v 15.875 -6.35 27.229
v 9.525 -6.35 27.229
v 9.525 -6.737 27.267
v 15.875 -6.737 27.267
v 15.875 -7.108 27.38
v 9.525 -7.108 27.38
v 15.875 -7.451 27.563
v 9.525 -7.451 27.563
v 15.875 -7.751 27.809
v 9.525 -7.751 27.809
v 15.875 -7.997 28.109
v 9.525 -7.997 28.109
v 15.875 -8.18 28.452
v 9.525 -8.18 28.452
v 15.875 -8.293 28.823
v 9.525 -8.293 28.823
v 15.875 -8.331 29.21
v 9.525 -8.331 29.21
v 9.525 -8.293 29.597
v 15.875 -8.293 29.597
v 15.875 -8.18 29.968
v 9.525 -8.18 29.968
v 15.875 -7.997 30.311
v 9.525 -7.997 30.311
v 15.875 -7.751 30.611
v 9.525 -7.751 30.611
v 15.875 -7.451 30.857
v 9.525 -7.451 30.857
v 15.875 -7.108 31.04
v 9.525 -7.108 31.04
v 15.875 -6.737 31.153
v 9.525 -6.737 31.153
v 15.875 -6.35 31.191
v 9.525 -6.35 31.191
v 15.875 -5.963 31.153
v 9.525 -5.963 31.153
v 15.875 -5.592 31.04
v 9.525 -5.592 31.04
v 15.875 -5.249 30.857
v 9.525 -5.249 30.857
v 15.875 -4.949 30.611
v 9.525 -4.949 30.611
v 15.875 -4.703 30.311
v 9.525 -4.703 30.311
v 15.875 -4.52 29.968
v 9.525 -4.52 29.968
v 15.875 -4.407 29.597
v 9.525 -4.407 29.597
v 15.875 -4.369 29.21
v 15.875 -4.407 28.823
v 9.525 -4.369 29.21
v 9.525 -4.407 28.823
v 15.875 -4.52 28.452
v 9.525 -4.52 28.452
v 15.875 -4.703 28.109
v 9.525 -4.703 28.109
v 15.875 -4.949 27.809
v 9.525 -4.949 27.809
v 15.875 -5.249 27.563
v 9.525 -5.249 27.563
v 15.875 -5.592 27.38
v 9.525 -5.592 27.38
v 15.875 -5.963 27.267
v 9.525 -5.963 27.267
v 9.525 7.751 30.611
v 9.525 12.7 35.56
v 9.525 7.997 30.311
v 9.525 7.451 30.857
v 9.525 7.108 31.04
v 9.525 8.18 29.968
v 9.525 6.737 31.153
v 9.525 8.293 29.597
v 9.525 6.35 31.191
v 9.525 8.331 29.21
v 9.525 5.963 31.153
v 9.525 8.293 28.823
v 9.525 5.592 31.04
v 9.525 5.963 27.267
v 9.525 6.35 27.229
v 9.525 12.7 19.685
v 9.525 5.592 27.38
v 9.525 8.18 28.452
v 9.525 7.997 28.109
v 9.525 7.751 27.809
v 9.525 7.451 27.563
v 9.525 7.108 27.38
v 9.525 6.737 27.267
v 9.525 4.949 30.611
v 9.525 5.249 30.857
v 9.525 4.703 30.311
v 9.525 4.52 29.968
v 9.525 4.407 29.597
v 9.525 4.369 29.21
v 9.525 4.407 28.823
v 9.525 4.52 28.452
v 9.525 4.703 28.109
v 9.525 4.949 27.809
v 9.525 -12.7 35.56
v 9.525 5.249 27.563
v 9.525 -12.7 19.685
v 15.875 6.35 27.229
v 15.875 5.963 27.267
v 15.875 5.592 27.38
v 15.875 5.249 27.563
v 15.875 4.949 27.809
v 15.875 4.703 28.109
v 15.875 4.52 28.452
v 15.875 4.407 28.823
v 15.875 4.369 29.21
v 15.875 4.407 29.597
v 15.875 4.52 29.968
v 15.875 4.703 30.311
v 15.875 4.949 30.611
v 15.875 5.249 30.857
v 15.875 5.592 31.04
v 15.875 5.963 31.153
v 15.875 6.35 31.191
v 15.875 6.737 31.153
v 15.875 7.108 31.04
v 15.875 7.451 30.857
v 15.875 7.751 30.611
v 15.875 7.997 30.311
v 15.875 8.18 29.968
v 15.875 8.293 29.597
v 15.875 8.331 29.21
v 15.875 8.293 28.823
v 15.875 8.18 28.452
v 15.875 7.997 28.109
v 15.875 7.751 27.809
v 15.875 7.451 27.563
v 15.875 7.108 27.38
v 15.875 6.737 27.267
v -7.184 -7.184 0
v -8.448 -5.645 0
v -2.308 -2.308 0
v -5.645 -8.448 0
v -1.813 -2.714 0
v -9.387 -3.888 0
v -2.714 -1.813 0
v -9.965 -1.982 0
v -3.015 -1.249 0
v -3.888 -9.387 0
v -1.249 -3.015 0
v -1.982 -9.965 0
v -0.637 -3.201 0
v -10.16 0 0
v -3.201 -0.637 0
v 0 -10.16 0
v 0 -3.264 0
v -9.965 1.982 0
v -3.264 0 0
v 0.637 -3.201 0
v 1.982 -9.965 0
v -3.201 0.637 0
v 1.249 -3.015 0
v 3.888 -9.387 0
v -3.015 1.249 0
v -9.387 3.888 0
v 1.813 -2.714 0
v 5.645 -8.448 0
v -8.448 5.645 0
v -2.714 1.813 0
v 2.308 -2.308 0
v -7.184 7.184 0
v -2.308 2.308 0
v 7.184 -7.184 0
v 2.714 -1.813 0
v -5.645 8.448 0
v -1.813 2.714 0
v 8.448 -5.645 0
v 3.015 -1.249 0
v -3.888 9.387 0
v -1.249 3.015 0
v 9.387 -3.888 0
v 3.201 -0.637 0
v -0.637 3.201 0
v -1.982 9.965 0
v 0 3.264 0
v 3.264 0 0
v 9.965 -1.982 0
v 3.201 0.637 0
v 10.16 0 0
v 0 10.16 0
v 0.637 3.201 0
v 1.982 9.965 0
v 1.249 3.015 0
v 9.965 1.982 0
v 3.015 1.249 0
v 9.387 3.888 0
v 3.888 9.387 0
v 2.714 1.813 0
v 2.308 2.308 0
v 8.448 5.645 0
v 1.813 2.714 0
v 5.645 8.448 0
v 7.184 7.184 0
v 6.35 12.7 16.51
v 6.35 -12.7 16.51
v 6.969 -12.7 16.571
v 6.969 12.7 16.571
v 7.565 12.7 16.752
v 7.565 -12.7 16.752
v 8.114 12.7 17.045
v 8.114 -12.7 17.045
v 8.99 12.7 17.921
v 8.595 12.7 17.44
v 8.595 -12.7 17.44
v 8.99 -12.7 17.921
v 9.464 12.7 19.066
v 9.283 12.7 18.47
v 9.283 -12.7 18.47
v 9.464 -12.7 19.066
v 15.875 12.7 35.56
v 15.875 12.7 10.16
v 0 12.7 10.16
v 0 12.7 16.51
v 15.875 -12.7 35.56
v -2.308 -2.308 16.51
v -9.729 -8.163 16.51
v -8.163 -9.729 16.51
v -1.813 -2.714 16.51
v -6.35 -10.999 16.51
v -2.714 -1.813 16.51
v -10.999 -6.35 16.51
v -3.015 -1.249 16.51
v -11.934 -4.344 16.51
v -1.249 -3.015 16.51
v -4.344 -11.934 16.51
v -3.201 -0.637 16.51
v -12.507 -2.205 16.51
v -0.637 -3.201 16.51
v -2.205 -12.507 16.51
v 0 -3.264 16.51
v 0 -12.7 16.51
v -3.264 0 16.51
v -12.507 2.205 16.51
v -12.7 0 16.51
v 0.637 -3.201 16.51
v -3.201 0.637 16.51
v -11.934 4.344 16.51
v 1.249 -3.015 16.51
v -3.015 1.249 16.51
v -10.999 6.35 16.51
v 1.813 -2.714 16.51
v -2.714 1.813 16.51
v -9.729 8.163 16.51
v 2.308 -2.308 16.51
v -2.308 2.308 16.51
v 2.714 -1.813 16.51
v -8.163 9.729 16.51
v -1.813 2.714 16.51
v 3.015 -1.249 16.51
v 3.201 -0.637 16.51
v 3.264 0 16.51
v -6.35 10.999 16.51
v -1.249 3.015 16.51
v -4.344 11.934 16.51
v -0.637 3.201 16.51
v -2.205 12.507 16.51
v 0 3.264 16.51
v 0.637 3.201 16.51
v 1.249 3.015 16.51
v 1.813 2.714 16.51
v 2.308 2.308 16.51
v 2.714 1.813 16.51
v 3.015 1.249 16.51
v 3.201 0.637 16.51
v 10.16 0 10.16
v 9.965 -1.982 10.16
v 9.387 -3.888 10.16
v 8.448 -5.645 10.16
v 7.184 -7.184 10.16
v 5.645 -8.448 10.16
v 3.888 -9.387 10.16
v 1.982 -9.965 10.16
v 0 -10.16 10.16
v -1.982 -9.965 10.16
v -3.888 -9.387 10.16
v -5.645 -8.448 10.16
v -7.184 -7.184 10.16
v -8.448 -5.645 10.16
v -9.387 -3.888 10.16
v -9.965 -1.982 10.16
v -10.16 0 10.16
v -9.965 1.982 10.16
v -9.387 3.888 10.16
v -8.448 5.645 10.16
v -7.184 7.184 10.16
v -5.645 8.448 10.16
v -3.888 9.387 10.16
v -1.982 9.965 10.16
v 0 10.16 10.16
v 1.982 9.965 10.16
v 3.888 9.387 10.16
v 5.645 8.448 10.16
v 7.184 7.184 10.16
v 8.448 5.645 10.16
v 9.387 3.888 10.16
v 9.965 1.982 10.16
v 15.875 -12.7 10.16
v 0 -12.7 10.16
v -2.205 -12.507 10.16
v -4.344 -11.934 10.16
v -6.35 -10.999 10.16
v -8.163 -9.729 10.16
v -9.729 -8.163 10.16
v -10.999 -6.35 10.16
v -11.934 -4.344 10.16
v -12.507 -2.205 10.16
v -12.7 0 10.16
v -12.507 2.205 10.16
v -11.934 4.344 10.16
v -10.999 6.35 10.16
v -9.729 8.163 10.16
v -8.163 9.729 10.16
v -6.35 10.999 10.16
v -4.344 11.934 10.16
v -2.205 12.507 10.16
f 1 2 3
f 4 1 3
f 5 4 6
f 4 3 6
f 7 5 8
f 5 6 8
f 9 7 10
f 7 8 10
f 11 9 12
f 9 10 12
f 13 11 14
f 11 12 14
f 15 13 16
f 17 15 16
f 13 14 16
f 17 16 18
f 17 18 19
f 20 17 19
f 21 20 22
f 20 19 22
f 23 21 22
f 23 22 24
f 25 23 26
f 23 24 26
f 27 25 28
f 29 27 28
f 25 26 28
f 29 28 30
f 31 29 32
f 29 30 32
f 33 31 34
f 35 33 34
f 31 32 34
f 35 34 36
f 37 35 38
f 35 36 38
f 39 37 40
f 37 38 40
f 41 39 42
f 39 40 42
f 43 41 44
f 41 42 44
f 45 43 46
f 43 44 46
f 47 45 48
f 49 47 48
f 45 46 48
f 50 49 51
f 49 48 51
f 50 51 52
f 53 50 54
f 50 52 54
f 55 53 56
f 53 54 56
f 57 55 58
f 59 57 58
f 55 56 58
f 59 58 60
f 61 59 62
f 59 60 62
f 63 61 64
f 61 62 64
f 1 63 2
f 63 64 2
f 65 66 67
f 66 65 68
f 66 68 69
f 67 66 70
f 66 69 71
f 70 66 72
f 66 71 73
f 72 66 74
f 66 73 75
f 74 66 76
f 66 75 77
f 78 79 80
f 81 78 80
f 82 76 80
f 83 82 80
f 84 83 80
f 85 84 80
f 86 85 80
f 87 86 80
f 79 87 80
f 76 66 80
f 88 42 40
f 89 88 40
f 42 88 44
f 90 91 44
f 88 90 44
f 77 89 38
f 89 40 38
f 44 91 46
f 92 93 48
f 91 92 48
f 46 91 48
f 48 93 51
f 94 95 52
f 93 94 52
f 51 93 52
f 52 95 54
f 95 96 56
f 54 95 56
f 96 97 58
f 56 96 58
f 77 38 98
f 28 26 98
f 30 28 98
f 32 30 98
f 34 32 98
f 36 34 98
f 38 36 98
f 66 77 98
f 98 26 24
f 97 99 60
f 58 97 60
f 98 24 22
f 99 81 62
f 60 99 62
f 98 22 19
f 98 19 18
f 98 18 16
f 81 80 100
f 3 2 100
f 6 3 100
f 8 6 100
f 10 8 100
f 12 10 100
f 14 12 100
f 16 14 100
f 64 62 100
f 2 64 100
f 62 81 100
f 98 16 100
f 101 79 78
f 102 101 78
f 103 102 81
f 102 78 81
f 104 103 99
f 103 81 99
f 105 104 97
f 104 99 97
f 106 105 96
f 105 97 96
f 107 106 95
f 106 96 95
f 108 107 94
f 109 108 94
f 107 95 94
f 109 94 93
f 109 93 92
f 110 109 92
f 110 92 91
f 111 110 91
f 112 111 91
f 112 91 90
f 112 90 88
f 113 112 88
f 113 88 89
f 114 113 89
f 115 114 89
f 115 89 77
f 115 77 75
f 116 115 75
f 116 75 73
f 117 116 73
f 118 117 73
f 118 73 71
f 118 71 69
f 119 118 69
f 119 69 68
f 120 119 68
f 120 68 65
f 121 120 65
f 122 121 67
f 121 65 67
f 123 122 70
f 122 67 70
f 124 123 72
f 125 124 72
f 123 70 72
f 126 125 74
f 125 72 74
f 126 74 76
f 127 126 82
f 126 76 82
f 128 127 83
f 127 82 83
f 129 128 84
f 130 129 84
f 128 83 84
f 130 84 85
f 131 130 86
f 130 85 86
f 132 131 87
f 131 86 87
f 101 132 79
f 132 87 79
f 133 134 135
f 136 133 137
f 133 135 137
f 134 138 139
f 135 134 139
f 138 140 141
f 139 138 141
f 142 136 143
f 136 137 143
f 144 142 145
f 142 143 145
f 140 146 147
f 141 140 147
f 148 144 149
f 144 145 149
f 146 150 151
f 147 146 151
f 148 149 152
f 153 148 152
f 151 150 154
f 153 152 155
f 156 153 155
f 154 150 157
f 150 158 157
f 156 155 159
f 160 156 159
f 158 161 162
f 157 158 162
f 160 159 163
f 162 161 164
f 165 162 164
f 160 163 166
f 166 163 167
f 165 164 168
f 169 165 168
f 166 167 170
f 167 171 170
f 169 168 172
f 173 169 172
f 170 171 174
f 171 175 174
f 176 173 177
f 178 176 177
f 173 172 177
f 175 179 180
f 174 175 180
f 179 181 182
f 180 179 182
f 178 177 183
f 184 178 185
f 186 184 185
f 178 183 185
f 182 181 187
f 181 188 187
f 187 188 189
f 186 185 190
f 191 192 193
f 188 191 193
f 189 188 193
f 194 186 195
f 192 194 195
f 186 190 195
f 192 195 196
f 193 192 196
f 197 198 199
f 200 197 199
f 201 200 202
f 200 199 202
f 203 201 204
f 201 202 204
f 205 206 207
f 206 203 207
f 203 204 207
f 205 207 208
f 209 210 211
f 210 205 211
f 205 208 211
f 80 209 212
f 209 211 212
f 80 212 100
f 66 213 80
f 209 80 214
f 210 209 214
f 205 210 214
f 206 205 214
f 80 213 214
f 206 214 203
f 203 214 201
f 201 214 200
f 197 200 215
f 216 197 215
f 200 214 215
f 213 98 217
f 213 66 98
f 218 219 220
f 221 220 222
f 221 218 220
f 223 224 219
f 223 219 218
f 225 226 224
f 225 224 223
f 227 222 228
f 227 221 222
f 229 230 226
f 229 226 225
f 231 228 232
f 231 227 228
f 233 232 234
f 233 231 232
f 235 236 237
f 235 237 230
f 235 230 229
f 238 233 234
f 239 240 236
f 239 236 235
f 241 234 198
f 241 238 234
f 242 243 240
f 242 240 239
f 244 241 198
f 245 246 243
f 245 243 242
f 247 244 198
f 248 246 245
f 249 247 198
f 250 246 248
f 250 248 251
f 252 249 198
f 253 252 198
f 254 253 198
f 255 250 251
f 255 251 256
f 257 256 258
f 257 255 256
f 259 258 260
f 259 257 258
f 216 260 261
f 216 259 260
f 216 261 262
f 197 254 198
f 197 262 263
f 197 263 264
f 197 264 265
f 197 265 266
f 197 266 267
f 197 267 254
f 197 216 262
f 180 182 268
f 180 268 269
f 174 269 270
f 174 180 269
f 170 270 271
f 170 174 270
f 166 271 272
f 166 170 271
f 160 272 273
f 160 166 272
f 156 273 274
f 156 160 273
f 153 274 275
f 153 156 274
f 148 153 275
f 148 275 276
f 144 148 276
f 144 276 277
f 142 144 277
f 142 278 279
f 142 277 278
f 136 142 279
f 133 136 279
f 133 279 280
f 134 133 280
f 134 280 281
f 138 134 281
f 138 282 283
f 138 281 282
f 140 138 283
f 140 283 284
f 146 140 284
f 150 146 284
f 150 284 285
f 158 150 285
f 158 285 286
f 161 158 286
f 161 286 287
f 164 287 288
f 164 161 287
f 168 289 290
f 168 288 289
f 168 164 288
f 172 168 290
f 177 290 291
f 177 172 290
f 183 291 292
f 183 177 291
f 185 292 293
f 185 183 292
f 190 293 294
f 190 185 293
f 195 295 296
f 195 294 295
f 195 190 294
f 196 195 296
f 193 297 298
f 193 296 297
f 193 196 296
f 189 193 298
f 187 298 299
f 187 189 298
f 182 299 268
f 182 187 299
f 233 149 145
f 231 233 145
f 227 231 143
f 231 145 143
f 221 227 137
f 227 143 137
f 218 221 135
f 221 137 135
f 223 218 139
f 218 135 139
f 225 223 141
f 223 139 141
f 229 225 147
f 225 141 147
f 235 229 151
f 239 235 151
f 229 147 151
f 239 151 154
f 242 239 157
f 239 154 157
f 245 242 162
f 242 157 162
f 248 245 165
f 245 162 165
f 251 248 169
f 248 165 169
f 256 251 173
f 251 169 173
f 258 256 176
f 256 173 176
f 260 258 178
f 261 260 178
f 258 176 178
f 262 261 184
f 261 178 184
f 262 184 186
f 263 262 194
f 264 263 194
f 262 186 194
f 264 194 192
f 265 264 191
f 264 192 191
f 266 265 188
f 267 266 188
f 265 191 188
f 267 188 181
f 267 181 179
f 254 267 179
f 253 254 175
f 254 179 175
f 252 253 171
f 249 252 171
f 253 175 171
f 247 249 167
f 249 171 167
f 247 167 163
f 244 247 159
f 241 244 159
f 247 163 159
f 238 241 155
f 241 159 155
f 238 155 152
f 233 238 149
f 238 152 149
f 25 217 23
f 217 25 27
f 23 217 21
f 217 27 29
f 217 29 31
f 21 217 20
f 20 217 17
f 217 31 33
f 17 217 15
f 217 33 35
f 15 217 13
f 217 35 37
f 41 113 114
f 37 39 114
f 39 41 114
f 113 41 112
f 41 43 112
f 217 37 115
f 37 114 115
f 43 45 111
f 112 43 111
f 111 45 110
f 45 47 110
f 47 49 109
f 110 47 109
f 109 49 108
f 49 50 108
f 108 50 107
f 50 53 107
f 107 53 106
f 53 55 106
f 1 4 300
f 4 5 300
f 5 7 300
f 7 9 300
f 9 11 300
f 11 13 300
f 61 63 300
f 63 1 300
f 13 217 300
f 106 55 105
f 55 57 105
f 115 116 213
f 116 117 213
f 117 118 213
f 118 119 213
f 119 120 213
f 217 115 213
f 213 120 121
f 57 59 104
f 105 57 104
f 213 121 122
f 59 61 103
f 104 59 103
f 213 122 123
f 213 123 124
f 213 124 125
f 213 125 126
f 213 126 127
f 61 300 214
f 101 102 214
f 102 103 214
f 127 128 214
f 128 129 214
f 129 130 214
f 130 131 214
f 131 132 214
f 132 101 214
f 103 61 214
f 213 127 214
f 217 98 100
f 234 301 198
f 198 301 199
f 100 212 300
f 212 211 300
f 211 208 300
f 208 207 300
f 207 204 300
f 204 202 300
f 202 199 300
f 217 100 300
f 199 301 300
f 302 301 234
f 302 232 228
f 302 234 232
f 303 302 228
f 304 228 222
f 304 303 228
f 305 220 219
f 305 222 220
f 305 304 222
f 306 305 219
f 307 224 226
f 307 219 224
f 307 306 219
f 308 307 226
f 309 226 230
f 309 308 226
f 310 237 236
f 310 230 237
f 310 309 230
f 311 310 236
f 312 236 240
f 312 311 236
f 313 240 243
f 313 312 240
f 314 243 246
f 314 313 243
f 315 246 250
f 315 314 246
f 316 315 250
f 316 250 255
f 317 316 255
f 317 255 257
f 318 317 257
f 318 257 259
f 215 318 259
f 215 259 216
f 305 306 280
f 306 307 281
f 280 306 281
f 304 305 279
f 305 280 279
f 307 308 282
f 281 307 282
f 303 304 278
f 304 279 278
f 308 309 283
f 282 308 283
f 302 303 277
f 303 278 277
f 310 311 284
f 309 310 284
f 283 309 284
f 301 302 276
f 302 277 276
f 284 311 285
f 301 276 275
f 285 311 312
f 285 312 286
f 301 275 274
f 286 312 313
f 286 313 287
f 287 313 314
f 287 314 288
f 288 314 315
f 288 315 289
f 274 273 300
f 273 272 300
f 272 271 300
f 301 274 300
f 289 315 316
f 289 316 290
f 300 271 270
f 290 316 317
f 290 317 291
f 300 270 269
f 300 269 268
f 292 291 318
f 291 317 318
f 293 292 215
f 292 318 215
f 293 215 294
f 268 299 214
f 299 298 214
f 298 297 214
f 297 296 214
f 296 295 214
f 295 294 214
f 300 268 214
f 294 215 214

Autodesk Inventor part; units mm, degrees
ref_plane "YZ Plane" through (0, 0, 0) normal (1, 0, 0) x (0, 1, 0)
ref_plane "XZ Plane" through (0, 0, 0) normal (0, 1, 0) x (-1, 0, 0)
ref_plane "XY Plane" through (0, 0, 0) normal (0, 0, 1) x (1, 0, 0)
sketch "Sketch1" plane through (0, 0, 0) normal (0, 0, 1) x (1, 0, 0)
  circle A0 centre (0, 0) radius 10.16
  circle A1 centre (0, 0) radius 8.7376
  dimension "d0" = 20.32
  dimension "d6" = 17.4752
extrude "Extrusion1" add sketch "Sketch1" along normal blind 10.16 contours A0 | A1
sketch "Sketch2" plane through (0, 0, 10.16) normal (0, 0, 1) x (1, 0, 0)
  circle A0 centre (0, 0) radius 10.16 projected
  circle A1 centre (0, 0) radius 12.7 construction
  line L0 (0, 12.7) -> (15.875, 12.7)
  line L1 (15.875, 12.7) -> (15.875, -12.7)
  line L2 (15.875, -12.7) -> (0, -12.7)
  arc A2 (0, 12.7) -> (0, -12.7) centre (0, 0) ccw
  point P0 (15.875, 0)
  dimension "d3" = 2.54
  dimension "d14" = 15.875
  dimension "d35" = 25.4
extrude "Extrusion2" add sketch "Sketch2" along normal blind 6.35 contours A0 | L0 L1 L2 A2
sketch "Sketch4" plane through (0, 0, 16.51) normal (0, 0, 1) x (1, 0, 0)
  arc A0 (0, 12.7) -> (0, -12.7) centre (0, 0) ccw projected
hole "Hole2" at (0, 0, 16.51) direction (0, 0, -1) diameter 6.5278 end through all clearance for "Flat Head Machine Screw (82)" size "1/4" standard "Ansi Unified Screw Threads"
sketch "Sketch5" plane through (0, 0, 16.51) normal (0, 0, 1) x (1, 0, 0)
  line L0 (15.875, 12.7) -> (0, 12.7) projected
  line L1 (0, -12.7) -> (15.875, -12.7) projected
  line L2 (15.875, 12.7) -> (9.525, 12.7)
  line L3 (9.525, 12.7) -> (9.525, -12.7)
  line L4 (9.525, -12.7) -> (15.875, -12.7)
  line L5 (15.875, -12.7) -> (15.875, 12.7)
  point P0 (0, 0)
  dimension "d22" = 6.35
extrude "Extrusion3" add sketch "Sketch5" along normal blind 19.05
fillet "Fillet1" radius 3.175 1 edges at (9.525, 0, 16.51)
sketch "Sketch6" plane through (15.875, -12.7, 10.16) normal (1, 0, 0) x (0, 0, -1)
  line L0 (-19.05, 19.05) -> (-19.05, 6.35) construction
  line L1 (-25.4, 0) -> (-25.4, 25.4) construction
  line L2 (0, 25.4) -> (-25.4, 25.4) construction
  point P0 (10.16, 12.7)
  point P1 (-19.05, 12.7)
  point P2 (-25.4, 12.7)
  point P3 (-12.7, 25.4)
  dimension "d26" = 12.7
  dimension "d34" = 6.35
hole "Hole3" at (15.875, 6.35, 29.21) at (15.875, -6.35, 29.21) direction (-1, 0, 0) diameter 3.9624 end through all thread size "10-32 UNF" class "2B" standard "ANSI Unified Screw Threads"
properties part number "constant force Spring Holder" material "ABS Plastic"
